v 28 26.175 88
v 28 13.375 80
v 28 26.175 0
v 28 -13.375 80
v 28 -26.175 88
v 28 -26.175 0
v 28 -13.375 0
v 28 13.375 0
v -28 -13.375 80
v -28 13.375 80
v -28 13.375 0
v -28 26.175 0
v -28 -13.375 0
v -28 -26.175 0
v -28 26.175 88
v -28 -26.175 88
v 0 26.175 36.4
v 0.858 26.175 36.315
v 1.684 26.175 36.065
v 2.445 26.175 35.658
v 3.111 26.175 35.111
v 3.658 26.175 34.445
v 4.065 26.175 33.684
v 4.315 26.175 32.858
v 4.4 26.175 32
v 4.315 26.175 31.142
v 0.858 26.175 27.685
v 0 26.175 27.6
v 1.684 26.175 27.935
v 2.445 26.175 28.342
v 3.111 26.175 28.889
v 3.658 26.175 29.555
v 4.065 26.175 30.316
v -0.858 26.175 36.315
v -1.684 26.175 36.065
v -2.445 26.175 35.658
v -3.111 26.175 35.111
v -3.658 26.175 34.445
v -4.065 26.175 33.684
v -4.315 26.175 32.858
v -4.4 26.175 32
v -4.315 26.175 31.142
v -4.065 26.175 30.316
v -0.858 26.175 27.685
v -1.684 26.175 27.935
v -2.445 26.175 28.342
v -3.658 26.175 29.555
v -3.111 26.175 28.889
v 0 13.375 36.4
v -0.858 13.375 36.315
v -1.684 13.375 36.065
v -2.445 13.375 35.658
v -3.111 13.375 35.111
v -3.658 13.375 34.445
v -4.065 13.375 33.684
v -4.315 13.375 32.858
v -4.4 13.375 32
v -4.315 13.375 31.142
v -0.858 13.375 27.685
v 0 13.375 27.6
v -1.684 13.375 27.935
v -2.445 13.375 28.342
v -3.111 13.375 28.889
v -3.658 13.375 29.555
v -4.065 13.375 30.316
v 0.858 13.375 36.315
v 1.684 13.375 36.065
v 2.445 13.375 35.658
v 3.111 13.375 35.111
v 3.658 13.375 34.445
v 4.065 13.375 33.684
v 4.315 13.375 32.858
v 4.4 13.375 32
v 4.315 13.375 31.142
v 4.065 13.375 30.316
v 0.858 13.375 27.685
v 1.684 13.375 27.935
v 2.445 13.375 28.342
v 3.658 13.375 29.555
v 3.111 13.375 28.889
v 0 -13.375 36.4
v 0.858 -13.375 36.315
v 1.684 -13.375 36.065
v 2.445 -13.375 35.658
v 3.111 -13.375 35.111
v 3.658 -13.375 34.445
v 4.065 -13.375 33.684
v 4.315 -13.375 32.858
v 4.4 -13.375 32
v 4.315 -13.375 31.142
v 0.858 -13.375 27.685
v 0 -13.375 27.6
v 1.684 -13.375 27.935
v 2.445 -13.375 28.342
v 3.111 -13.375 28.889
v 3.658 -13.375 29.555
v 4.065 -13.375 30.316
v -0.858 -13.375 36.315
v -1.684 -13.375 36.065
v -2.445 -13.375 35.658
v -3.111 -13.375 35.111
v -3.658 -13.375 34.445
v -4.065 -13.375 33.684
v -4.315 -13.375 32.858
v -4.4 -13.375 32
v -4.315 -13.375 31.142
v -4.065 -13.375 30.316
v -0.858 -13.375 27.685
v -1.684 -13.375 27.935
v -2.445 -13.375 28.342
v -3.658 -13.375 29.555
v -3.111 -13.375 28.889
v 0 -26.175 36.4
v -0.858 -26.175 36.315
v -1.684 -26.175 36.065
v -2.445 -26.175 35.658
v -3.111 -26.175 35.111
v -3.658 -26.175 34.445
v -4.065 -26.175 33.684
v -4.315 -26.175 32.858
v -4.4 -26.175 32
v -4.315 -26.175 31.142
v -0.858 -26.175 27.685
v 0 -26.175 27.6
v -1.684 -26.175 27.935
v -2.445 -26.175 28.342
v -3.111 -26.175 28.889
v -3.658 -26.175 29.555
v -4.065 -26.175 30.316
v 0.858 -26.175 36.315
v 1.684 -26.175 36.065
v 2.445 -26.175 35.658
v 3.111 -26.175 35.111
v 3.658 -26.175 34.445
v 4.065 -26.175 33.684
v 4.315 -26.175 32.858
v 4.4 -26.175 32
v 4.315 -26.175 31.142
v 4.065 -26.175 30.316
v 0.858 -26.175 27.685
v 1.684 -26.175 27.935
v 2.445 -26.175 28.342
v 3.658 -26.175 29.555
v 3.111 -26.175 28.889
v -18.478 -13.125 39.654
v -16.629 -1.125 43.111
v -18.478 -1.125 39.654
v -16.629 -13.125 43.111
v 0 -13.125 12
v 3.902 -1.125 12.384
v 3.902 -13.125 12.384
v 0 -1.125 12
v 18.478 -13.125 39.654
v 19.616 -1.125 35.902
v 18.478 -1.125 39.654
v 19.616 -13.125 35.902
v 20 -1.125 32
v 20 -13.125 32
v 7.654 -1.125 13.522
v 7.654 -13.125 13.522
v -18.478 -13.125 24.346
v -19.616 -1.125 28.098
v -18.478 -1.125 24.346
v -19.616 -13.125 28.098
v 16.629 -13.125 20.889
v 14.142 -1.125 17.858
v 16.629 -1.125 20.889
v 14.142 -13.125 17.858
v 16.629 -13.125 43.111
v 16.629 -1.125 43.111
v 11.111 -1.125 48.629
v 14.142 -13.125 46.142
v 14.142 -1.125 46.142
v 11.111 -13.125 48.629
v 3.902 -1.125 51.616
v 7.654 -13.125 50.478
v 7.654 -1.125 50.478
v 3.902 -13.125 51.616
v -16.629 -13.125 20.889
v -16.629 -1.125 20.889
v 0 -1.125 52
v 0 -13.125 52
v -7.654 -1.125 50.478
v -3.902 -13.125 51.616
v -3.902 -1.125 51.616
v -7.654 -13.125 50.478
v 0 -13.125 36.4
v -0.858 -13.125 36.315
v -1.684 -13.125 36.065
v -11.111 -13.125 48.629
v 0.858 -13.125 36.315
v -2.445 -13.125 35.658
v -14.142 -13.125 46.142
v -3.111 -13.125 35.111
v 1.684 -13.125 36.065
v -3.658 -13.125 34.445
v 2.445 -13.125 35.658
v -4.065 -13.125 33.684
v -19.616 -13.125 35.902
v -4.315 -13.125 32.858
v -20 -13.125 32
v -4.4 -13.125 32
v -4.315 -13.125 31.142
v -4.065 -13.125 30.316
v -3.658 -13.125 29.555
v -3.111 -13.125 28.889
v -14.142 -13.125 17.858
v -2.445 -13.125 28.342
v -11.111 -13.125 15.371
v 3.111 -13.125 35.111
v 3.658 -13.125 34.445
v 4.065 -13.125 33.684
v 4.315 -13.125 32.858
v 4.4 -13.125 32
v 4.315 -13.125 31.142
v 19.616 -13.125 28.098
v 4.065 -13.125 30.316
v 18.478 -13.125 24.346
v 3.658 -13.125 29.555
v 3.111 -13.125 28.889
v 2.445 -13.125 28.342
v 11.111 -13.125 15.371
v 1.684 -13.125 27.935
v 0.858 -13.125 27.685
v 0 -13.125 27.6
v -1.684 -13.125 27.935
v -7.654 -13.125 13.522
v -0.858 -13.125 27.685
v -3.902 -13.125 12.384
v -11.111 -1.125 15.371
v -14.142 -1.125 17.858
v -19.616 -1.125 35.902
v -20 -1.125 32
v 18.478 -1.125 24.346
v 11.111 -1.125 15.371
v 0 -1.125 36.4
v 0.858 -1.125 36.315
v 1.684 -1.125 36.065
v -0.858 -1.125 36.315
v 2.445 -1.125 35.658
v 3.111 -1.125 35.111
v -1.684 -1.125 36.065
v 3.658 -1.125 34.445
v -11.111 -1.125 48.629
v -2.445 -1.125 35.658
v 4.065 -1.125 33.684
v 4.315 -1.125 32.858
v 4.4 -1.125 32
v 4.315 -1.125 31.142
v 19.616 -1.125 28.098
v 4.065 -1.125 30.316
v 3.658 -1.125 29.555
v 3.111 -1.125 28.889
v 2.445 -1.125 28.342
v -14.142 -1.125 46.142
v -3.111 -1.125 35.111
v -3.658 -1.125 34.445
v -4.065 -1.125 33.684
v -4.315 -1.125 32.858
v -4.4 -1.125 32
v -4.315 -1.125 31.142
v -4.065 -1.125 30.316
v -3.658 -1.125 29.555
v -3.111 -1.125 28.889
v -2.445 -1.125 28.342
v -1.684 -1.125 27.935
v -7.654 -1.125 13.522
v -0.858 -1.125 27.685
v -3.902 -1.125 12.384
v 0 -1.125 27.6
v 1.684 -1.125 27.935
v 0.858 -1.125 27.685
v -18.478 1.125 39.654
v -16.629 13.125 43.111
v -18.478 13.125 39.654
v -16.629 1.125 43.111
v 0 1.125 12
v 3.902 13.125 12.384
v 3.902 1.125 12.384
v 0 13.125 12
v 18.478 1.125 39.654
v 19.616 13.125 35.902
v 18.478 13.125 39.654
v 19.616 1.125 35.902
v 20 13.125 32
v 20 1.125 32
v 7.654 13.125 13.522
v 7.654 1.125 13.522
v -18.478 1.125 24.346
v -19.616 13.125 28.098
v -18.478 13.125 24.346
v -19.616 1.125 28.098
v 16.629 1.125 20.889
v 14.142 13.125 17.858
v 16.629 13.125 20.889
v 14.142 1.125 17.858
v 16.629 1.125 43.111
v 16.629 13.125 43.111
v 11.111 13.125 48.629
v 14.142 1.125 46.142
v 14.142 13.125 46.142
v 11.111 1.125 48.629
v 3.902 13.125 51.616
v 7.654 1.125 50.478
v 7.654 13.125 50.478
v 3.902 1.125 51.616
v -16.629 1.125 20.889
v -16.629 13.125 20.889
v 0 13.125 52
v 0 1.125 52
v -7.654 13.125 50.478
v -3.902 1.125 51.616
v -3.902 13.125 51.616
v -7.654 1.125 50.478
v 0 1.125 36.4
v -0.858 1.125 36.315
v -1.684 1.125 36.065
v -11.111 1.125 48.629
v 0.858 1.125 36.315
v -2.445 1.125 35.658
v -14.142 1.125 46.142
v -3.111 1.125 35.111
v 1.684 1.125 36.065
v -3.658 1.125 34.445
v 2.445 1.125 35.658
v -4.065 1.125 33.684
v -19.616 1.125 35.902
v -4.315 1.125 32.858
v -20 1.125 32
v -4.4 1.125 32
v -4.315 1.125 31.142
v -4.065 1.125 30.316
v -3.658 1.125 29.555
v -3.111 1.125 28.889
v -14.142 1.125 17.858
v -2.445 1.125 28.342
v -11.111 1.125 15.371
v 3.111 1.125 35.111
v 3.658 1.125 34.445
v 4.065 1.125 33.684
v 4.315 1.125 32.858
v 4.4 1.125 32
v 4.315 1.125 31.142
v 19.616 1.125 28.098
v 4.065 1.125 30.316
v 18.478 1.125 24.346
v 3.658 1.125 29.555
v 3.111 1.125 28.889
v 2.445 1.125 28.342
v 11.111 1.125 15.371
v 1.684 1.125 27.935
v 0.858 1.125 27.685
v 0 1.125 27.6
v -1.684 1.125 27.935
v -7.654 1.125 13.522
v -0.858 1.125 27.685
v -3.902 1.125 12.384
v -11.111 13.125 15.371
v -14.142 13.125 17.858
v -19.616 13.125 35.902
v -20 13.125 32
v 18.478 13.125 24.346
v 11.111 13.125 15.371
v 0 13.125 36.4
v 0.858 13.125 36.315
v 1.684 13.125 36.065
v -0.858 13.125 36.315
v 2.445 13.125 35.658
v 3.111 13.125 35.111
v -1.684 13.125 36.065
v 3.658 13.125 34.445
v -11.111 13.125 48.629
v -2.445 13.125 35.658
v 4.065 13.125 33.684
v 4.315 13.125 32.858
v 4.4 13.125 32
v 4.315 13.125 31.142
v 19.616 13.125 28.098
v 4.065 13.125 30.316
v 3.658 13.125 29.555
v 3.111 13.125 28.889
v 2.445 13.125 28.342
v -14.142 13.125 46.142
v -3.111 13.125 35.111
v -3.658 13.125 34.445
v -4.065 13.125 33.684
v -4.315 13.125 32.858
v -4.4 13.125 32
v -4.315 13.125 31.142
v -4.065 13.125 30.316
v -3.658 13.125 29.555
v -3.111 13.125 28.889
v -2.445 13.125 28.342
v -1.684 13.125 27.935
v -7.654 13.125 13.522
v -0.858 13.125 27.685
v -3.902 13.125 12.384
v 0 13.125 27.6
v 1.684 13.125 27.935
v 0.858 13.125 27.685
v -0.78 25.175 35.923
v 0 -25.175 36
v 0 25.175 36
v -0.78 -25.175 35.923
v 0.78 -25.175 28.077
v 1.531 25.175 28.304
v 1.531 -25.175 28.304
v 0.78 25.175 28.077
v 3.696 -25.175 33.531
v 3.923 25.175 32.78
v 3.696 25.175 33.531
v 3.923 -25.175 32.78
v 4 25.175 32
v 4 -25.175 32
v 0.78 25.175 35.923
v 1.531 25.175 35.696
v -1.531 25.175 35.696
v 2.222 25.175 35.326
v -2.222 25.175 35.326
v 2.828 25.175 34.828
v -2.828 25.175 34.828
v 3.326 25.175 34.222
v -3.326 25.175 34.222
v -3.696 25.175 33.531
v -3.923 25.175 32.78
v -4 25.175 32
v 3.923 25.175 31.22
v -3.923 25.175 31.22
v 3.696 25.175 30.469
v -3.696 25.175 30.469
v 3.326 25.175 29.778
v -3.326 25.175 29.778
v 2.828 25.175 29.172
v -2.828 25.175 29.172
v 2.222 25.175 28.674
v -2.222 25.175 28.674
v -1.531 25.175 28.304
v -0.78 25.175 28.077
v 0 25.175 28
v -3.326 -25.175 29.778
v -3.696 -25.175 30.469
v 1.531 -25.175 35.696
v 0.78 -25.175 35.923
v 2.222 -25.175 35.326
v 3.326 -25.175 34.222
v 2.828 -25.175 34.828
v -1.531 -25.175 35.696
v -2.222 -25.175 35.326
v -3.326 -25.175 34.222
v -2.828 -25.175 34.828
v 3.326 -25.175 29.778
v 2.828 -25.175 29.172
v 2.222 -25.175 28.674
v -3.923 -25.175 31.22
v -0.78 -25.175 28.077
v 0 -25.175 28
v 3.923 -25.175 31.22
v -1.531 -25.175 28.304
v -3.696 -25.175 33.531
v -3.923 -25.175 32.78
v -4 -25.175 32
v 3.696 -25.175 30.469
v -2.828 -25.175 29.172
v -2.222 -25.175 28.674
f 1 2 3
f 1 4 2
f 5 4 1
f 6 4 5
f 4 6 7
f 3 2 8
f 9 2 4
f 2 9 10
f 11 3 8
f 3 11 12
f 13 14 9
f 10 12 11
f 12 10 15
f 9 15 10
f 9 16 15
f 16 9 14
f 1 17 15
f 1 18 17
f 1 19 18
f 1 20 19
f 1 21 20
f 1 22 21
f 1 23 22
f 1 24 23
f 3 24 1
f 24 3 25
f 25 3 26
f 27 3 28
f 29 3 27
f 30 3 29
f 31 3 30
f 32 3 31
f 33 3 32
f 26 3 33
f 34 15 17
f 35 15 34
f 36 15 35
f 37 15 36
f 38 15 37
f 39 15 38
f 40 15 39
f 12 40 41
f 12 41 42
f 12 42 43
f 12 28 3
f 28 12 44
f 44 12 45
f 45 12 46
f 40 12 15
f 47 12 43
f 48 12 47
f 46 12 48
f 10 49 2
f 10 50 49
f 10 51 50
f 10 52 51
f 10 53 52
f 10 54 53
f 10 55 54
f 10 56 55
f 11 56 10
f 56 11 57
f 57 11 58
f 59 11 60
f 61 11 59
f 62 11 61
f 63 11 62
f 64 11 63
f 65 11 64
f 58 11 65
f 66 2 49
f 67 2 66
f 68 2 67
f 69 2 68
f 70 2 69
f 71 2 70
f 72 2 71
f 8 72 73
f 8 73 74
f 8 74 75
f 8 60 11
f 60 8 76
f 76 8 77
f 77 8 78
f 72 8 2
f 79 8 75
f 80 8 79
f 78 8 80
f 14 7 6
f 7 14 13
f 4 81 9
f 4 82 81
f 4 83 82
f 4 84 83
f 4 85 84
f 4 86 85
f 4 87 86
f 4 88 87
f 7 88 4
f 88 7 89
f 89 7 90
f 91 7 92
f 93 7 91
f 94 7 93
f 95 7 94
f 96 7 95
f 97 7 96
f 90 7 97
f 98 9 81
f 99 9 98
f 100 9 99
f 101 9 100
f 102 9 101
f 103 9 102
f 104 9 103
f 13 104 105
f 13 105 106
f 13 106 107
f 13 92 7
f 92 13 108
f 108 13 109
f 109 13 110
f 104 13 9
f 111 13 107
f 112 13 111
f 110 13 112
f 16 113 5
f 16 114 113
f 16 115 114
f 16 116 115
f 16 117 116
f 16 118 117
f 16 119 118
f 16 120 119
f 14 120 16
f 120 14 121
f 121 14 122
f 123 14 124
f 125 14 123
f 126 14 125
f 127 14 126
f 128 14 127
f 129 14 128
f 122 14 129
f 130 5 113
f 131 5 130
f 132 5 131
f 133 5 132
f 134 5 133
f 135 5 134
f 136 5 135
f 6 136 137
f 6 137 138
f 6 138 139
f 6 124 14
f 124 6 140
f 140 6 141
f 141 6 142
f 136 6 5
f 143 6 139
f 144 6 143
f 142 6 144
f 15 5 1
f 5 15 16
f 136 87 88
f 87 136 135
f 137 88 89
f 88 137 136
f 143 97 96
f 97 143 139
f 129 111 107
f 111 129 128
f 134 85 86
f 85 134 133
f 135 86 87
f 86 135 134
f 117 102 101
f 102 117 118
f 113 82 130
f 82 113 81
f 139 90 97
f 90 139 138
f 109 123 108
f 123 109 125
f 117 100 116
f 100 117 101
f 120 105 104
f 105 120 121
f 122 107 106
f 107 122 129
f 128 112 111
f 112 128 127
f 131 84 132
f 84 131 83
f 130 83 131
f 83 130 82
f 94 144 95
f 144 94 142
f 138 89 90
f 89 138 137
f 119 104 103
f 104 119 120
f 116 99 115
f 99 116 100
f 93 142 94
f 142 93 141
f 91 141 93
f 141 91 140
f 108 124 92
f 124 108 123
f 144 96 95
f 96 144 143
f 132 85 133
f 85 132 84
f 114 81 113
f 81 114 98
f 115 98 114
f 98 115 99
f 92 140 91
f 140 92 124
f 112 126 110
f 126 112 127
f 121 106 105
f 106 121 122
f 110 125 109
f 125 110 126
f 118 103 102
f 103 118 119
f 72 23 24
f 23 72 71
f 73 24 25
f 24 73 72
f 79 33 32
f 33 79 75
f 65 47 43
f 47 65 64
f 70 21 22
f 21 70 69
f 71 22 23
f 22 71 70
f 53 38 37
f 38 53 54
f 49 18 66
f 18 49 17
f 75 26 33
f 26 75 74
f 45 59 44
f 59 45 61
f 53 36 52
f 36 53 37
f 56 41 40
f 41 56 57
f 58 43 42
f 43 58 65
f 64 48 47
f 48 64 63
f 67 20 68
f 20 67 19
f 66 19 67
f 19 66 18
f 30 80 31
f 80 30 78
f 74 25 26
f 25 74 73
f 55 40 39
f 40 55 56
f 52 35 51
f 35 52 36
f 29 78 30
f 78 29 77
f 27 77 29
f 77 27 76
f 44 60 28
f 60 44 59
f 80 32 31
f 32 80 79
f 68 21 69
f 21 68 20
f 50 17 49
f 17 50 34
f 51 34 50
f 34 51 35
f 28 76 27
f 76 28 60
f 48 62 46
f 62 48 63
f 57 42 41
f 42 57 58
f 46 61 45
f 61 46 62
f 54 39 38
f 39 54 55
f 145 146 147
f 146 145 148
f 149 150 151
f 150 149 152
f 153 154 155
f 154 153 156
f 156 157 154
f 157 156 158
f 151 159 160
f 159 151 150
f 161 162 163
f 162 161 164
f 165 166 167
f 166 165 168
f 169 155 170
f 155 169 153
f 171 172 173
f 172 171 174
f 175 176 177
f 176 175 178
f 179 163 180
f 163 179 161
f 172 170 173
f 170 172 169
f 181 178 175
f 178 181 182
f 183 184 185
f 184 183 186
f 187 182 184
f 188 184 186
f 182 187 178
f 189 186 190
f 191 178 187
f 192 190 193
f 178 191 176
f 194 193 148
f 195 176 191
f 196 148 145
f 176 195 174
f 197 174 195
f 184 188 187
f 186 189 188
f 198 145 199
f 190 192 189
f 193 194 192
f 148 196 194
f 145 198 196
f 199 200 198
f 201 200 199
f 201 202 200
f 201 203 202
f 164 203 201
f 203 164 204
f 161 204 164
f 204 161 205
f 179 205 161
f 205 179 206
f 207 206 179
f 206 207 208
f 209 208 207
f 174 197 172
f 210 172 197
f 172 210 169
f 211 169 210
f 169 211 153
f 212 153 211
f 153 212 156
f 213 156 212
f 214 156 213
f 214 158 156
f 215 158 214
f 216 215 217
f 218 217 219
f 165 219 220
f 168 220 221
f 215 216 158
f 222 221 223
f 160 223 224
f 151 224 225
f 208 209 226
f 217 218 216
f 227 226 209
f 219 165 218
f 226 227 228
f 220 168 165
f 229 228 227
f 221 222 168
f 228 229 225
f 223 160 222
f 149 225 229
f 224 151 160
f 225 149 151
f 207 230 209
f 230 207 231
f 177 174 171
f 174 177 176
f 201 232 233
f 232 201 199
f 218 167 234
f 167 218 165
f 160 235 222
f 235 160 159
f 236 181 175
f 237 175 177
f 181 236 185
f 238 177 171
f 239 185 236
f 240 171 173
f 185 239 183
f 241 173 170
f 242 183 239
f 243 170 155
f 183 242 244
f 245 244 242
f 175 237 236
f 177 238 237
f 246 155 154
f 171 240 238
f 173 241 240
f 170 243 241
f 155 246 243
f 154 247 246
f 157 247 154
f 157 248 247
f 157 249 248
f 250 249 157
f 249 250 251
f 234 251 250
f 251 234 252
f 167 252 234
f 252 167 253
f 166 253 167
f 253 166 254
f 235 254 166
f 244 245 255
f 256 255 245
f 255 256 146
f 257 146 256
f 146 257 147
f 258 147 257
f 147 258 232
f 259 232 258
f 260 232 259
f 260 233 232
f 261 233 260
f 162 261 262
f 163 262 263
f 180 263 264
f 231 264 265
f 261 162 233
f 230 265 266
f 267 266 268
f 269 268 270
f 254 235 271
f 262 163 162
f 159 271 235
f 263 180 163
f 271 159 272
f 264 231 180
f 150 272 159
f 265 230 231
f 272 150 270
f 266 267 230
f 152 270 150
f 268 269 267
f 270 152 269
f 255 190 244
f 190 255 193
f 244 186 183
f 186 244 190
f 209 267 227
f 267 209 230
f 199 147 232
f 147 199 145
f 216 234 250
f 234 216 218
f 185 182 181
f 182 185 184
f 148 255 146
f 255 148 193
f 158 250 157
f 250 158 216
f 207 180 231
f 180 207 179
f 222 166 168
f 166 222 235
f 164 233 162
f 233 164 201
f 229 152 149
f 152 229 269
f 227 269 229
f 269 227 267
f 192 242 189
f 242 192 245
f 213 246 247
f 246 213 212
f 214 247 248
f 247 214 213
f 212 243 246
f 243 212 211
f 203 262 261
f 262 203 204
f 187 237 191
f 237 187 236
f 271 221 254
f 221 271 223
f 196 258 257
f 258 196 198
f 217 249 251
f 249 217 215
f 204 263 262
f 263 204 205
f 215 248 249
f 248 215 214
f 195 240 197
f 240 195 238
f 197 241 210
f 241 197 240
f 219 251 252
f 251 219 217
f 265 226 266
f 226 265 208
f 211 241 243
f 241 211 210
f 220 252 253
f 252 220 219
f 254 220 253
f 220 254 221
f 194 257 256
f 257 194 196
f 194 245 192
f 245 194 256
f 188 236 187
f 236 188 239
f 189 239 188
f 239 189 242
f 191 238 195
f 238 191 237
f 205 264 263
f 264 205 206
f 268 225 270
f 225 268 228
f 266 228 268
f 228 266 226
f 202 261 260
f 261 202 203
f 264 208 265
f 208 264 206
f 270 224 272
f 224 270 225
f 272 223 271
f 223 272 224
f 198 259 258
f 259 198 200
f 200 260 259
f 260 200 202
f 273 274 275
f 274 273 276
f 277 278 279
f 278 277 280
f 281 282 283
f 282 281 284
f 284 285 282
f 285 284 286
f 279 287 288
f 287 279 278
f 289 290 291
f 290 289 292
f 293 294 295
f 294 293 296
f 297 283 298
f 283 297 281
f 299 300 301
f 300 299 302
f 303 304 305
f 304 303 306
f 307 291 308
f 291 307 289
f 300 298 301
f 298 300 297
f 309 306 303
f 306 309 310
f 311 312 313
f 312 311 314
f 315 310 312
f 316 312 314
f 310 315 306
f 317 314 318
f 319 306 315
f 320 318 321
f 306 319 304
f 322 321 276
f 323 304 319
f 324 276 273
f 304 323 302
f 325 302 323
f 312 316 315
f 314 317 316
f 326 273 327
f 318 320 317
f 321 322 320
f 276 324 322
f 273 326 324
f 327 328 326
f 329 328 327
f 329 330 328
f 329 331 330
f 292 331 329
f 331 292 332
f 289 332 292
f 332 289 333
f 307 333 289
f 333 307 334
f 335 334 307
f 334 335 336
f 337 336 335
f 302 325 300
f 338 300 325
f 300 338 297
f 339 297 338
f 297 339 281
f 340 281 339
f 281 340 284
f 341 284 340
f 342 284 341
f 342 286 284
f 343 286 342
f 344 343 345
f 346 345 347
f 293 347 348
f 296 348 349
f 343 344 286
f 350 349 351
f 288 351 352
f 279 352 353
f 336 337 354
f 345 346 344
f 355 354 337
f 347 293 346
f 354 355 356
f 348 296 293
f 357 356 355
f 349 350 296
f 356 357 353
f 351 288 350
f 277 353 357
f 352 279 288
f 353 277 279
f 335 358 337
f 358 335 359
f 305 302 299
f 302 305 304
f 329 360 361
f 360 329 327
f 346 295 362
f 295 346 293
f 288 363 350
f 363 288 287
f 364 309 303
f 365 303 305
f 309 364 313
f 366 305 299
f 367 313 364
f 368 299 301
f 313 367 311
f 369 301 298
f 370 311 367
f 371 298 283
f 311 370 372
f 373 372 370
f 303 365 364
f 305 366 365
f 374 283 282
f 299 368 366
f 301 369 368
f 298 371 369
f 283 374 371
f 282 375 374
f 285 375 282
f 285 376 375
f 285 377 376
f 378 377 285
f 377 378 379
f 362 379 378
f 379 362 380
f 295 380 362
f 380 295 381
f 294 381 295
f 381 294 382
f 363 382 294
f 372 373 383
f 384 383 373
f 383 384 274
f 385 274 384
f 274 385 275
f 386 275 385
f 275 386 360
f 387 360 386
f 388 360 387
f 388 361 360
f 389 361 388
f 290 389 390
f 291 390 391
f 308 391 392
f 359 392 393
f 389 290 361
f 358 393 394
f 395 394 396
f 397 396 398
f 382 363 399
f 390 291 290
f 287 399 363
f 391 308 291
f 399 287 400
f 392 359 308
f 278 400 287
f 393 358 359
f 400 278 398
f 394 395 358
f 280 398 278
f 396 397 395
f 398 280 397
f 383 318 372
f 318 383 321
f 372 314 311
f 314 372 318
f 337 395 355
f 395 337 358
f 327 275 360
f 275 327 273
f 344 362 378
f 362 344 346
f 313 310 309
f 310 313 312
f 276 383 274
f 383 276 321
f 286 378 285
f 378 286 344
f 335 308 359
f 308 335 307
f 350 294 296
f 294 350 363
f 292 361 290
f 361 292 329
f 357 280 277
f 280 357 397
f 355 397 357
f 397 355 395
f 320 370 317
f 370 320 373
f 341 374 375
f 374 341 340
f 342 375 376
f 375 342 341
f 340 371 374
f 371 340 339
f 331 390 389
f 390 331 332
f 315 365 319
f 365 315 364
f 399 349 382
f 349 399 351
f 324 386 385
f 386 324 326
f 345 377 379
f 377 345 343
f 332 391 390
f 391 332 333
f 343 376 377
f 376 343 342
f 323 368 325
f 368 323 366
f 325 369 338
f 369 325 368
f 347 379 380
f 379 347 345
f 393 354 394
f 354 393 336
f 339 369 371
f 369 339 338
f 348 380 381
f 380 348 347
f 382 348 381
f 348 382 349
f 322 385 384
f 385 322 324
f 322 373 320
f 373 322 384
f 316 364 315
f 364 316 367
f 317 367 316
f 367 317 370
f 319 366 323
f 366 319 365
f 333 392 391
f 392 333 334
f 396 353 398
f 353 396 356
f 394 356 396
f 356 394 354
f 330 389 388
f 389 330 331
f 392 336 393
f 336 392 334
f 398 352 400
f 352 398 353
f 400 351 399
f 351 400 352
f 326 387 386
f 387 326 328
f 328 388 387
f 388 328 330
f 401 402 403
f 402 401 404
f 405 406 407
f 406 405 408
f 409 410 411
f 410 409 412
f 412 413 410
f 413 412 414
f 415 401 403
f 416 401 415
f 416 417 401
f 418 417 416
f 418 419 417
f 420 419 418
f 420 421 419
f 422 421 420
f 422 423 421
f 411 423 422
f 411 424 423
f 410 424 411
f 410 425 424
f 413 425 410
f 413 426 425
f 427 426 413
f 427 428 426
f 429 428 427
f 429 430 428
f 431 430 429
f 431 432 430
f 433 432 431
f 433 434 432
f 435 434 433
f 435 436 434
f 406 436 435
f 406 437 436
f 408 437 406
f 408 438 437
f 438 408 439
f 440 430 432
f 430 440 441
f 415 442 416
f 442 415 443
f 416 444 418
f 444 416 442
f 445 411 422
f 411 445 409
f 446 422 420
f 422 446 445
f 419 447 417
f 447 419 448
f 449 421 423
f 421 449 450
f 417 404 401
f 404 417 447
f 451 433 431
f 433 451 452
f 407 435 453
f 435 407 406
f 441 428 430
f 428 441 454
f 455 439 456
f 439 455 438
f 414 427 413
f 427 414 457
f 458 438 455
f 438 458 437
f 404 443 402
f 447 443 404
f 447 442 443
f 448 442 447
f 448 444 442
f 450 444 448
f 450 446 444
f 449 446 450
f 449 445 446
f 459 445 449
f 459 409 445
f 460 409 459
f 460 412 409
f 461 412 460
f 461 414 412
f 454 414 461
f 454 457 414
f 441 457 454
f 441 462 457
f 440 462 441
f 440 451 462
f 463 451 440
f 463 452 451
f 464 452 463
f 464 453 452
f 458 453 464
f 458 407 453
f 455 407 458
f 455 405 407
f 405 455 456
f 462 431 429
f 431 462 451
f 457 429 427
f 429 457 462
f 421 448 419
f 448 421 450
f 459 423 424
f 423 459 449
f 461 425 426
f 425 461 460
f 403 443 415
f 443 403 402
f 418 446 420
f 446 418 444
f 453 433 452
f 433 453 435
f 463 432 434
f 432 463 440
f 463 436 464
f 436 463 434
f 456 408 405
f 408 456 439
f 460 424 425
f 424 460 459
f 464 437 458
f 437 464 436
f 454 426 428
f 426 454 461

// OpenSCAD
$fn = 32;

// ------------------------------------------------------------------------
// Trolley wheel set: wheels d40, fork 80 mm tall
// Every part is its own module, assembly() places every instance.
// ------------------------------------------------------------------------

// --- part 1 ---
module trolley_fork() {
  difference() {
    union() {
      translate([-28, 13.375, 0]) cube([56, 12.8, 80]);
      translate([-28, -26.175, 0]) cube([56, 12.8, 80]);
      translate([-28, -26.175, 80]) cube([56, 52.35, 8]);
    }
    translate([0, -19.775, 32]) rotate([90, 0, 0]) cylinder(h = 14.8, d = 8.8, center = true);
    translate([0, 19.775, 32]) rotate([90, 0, 0]) cylinder(h = 14.8, d = 8.8, center = true);
  }
}

// --- part 2 ---
module trolley_wheel() {
  difference() {
      translate([0, 0, 0]) cylinder(h = 12, d = 40);
      translate([0, 0, -1]) cylinder(h = 14, d = 8.8);
    }
}

// --- part 3 ---
module trolley_axle() {
  translate([0, 0, -25.175]) cylinder(h = 50.35, d = 8);
}

// --- assembly ---
module assembly() {
  color([0.80, 0.24, 0.20]) translate([0, 0, 0]) rotate([0, 0, 0]) trolley_fork();
  color([0.20, 0.45, 0.75]) translate([0, -1.125, 32]) rotate([90, 0, 0]) trolley_wheel();
  color([0.25, 0.62, 0.32]) translate([0, 13.125, 32]) rotate([90, 0, 0]) trolley_wheel();
  color([0.92, 0.70, 0.18]) translate([0, 0, 32]) rotate([90, 0, 0]) trolley_axle();
}

assembly();
